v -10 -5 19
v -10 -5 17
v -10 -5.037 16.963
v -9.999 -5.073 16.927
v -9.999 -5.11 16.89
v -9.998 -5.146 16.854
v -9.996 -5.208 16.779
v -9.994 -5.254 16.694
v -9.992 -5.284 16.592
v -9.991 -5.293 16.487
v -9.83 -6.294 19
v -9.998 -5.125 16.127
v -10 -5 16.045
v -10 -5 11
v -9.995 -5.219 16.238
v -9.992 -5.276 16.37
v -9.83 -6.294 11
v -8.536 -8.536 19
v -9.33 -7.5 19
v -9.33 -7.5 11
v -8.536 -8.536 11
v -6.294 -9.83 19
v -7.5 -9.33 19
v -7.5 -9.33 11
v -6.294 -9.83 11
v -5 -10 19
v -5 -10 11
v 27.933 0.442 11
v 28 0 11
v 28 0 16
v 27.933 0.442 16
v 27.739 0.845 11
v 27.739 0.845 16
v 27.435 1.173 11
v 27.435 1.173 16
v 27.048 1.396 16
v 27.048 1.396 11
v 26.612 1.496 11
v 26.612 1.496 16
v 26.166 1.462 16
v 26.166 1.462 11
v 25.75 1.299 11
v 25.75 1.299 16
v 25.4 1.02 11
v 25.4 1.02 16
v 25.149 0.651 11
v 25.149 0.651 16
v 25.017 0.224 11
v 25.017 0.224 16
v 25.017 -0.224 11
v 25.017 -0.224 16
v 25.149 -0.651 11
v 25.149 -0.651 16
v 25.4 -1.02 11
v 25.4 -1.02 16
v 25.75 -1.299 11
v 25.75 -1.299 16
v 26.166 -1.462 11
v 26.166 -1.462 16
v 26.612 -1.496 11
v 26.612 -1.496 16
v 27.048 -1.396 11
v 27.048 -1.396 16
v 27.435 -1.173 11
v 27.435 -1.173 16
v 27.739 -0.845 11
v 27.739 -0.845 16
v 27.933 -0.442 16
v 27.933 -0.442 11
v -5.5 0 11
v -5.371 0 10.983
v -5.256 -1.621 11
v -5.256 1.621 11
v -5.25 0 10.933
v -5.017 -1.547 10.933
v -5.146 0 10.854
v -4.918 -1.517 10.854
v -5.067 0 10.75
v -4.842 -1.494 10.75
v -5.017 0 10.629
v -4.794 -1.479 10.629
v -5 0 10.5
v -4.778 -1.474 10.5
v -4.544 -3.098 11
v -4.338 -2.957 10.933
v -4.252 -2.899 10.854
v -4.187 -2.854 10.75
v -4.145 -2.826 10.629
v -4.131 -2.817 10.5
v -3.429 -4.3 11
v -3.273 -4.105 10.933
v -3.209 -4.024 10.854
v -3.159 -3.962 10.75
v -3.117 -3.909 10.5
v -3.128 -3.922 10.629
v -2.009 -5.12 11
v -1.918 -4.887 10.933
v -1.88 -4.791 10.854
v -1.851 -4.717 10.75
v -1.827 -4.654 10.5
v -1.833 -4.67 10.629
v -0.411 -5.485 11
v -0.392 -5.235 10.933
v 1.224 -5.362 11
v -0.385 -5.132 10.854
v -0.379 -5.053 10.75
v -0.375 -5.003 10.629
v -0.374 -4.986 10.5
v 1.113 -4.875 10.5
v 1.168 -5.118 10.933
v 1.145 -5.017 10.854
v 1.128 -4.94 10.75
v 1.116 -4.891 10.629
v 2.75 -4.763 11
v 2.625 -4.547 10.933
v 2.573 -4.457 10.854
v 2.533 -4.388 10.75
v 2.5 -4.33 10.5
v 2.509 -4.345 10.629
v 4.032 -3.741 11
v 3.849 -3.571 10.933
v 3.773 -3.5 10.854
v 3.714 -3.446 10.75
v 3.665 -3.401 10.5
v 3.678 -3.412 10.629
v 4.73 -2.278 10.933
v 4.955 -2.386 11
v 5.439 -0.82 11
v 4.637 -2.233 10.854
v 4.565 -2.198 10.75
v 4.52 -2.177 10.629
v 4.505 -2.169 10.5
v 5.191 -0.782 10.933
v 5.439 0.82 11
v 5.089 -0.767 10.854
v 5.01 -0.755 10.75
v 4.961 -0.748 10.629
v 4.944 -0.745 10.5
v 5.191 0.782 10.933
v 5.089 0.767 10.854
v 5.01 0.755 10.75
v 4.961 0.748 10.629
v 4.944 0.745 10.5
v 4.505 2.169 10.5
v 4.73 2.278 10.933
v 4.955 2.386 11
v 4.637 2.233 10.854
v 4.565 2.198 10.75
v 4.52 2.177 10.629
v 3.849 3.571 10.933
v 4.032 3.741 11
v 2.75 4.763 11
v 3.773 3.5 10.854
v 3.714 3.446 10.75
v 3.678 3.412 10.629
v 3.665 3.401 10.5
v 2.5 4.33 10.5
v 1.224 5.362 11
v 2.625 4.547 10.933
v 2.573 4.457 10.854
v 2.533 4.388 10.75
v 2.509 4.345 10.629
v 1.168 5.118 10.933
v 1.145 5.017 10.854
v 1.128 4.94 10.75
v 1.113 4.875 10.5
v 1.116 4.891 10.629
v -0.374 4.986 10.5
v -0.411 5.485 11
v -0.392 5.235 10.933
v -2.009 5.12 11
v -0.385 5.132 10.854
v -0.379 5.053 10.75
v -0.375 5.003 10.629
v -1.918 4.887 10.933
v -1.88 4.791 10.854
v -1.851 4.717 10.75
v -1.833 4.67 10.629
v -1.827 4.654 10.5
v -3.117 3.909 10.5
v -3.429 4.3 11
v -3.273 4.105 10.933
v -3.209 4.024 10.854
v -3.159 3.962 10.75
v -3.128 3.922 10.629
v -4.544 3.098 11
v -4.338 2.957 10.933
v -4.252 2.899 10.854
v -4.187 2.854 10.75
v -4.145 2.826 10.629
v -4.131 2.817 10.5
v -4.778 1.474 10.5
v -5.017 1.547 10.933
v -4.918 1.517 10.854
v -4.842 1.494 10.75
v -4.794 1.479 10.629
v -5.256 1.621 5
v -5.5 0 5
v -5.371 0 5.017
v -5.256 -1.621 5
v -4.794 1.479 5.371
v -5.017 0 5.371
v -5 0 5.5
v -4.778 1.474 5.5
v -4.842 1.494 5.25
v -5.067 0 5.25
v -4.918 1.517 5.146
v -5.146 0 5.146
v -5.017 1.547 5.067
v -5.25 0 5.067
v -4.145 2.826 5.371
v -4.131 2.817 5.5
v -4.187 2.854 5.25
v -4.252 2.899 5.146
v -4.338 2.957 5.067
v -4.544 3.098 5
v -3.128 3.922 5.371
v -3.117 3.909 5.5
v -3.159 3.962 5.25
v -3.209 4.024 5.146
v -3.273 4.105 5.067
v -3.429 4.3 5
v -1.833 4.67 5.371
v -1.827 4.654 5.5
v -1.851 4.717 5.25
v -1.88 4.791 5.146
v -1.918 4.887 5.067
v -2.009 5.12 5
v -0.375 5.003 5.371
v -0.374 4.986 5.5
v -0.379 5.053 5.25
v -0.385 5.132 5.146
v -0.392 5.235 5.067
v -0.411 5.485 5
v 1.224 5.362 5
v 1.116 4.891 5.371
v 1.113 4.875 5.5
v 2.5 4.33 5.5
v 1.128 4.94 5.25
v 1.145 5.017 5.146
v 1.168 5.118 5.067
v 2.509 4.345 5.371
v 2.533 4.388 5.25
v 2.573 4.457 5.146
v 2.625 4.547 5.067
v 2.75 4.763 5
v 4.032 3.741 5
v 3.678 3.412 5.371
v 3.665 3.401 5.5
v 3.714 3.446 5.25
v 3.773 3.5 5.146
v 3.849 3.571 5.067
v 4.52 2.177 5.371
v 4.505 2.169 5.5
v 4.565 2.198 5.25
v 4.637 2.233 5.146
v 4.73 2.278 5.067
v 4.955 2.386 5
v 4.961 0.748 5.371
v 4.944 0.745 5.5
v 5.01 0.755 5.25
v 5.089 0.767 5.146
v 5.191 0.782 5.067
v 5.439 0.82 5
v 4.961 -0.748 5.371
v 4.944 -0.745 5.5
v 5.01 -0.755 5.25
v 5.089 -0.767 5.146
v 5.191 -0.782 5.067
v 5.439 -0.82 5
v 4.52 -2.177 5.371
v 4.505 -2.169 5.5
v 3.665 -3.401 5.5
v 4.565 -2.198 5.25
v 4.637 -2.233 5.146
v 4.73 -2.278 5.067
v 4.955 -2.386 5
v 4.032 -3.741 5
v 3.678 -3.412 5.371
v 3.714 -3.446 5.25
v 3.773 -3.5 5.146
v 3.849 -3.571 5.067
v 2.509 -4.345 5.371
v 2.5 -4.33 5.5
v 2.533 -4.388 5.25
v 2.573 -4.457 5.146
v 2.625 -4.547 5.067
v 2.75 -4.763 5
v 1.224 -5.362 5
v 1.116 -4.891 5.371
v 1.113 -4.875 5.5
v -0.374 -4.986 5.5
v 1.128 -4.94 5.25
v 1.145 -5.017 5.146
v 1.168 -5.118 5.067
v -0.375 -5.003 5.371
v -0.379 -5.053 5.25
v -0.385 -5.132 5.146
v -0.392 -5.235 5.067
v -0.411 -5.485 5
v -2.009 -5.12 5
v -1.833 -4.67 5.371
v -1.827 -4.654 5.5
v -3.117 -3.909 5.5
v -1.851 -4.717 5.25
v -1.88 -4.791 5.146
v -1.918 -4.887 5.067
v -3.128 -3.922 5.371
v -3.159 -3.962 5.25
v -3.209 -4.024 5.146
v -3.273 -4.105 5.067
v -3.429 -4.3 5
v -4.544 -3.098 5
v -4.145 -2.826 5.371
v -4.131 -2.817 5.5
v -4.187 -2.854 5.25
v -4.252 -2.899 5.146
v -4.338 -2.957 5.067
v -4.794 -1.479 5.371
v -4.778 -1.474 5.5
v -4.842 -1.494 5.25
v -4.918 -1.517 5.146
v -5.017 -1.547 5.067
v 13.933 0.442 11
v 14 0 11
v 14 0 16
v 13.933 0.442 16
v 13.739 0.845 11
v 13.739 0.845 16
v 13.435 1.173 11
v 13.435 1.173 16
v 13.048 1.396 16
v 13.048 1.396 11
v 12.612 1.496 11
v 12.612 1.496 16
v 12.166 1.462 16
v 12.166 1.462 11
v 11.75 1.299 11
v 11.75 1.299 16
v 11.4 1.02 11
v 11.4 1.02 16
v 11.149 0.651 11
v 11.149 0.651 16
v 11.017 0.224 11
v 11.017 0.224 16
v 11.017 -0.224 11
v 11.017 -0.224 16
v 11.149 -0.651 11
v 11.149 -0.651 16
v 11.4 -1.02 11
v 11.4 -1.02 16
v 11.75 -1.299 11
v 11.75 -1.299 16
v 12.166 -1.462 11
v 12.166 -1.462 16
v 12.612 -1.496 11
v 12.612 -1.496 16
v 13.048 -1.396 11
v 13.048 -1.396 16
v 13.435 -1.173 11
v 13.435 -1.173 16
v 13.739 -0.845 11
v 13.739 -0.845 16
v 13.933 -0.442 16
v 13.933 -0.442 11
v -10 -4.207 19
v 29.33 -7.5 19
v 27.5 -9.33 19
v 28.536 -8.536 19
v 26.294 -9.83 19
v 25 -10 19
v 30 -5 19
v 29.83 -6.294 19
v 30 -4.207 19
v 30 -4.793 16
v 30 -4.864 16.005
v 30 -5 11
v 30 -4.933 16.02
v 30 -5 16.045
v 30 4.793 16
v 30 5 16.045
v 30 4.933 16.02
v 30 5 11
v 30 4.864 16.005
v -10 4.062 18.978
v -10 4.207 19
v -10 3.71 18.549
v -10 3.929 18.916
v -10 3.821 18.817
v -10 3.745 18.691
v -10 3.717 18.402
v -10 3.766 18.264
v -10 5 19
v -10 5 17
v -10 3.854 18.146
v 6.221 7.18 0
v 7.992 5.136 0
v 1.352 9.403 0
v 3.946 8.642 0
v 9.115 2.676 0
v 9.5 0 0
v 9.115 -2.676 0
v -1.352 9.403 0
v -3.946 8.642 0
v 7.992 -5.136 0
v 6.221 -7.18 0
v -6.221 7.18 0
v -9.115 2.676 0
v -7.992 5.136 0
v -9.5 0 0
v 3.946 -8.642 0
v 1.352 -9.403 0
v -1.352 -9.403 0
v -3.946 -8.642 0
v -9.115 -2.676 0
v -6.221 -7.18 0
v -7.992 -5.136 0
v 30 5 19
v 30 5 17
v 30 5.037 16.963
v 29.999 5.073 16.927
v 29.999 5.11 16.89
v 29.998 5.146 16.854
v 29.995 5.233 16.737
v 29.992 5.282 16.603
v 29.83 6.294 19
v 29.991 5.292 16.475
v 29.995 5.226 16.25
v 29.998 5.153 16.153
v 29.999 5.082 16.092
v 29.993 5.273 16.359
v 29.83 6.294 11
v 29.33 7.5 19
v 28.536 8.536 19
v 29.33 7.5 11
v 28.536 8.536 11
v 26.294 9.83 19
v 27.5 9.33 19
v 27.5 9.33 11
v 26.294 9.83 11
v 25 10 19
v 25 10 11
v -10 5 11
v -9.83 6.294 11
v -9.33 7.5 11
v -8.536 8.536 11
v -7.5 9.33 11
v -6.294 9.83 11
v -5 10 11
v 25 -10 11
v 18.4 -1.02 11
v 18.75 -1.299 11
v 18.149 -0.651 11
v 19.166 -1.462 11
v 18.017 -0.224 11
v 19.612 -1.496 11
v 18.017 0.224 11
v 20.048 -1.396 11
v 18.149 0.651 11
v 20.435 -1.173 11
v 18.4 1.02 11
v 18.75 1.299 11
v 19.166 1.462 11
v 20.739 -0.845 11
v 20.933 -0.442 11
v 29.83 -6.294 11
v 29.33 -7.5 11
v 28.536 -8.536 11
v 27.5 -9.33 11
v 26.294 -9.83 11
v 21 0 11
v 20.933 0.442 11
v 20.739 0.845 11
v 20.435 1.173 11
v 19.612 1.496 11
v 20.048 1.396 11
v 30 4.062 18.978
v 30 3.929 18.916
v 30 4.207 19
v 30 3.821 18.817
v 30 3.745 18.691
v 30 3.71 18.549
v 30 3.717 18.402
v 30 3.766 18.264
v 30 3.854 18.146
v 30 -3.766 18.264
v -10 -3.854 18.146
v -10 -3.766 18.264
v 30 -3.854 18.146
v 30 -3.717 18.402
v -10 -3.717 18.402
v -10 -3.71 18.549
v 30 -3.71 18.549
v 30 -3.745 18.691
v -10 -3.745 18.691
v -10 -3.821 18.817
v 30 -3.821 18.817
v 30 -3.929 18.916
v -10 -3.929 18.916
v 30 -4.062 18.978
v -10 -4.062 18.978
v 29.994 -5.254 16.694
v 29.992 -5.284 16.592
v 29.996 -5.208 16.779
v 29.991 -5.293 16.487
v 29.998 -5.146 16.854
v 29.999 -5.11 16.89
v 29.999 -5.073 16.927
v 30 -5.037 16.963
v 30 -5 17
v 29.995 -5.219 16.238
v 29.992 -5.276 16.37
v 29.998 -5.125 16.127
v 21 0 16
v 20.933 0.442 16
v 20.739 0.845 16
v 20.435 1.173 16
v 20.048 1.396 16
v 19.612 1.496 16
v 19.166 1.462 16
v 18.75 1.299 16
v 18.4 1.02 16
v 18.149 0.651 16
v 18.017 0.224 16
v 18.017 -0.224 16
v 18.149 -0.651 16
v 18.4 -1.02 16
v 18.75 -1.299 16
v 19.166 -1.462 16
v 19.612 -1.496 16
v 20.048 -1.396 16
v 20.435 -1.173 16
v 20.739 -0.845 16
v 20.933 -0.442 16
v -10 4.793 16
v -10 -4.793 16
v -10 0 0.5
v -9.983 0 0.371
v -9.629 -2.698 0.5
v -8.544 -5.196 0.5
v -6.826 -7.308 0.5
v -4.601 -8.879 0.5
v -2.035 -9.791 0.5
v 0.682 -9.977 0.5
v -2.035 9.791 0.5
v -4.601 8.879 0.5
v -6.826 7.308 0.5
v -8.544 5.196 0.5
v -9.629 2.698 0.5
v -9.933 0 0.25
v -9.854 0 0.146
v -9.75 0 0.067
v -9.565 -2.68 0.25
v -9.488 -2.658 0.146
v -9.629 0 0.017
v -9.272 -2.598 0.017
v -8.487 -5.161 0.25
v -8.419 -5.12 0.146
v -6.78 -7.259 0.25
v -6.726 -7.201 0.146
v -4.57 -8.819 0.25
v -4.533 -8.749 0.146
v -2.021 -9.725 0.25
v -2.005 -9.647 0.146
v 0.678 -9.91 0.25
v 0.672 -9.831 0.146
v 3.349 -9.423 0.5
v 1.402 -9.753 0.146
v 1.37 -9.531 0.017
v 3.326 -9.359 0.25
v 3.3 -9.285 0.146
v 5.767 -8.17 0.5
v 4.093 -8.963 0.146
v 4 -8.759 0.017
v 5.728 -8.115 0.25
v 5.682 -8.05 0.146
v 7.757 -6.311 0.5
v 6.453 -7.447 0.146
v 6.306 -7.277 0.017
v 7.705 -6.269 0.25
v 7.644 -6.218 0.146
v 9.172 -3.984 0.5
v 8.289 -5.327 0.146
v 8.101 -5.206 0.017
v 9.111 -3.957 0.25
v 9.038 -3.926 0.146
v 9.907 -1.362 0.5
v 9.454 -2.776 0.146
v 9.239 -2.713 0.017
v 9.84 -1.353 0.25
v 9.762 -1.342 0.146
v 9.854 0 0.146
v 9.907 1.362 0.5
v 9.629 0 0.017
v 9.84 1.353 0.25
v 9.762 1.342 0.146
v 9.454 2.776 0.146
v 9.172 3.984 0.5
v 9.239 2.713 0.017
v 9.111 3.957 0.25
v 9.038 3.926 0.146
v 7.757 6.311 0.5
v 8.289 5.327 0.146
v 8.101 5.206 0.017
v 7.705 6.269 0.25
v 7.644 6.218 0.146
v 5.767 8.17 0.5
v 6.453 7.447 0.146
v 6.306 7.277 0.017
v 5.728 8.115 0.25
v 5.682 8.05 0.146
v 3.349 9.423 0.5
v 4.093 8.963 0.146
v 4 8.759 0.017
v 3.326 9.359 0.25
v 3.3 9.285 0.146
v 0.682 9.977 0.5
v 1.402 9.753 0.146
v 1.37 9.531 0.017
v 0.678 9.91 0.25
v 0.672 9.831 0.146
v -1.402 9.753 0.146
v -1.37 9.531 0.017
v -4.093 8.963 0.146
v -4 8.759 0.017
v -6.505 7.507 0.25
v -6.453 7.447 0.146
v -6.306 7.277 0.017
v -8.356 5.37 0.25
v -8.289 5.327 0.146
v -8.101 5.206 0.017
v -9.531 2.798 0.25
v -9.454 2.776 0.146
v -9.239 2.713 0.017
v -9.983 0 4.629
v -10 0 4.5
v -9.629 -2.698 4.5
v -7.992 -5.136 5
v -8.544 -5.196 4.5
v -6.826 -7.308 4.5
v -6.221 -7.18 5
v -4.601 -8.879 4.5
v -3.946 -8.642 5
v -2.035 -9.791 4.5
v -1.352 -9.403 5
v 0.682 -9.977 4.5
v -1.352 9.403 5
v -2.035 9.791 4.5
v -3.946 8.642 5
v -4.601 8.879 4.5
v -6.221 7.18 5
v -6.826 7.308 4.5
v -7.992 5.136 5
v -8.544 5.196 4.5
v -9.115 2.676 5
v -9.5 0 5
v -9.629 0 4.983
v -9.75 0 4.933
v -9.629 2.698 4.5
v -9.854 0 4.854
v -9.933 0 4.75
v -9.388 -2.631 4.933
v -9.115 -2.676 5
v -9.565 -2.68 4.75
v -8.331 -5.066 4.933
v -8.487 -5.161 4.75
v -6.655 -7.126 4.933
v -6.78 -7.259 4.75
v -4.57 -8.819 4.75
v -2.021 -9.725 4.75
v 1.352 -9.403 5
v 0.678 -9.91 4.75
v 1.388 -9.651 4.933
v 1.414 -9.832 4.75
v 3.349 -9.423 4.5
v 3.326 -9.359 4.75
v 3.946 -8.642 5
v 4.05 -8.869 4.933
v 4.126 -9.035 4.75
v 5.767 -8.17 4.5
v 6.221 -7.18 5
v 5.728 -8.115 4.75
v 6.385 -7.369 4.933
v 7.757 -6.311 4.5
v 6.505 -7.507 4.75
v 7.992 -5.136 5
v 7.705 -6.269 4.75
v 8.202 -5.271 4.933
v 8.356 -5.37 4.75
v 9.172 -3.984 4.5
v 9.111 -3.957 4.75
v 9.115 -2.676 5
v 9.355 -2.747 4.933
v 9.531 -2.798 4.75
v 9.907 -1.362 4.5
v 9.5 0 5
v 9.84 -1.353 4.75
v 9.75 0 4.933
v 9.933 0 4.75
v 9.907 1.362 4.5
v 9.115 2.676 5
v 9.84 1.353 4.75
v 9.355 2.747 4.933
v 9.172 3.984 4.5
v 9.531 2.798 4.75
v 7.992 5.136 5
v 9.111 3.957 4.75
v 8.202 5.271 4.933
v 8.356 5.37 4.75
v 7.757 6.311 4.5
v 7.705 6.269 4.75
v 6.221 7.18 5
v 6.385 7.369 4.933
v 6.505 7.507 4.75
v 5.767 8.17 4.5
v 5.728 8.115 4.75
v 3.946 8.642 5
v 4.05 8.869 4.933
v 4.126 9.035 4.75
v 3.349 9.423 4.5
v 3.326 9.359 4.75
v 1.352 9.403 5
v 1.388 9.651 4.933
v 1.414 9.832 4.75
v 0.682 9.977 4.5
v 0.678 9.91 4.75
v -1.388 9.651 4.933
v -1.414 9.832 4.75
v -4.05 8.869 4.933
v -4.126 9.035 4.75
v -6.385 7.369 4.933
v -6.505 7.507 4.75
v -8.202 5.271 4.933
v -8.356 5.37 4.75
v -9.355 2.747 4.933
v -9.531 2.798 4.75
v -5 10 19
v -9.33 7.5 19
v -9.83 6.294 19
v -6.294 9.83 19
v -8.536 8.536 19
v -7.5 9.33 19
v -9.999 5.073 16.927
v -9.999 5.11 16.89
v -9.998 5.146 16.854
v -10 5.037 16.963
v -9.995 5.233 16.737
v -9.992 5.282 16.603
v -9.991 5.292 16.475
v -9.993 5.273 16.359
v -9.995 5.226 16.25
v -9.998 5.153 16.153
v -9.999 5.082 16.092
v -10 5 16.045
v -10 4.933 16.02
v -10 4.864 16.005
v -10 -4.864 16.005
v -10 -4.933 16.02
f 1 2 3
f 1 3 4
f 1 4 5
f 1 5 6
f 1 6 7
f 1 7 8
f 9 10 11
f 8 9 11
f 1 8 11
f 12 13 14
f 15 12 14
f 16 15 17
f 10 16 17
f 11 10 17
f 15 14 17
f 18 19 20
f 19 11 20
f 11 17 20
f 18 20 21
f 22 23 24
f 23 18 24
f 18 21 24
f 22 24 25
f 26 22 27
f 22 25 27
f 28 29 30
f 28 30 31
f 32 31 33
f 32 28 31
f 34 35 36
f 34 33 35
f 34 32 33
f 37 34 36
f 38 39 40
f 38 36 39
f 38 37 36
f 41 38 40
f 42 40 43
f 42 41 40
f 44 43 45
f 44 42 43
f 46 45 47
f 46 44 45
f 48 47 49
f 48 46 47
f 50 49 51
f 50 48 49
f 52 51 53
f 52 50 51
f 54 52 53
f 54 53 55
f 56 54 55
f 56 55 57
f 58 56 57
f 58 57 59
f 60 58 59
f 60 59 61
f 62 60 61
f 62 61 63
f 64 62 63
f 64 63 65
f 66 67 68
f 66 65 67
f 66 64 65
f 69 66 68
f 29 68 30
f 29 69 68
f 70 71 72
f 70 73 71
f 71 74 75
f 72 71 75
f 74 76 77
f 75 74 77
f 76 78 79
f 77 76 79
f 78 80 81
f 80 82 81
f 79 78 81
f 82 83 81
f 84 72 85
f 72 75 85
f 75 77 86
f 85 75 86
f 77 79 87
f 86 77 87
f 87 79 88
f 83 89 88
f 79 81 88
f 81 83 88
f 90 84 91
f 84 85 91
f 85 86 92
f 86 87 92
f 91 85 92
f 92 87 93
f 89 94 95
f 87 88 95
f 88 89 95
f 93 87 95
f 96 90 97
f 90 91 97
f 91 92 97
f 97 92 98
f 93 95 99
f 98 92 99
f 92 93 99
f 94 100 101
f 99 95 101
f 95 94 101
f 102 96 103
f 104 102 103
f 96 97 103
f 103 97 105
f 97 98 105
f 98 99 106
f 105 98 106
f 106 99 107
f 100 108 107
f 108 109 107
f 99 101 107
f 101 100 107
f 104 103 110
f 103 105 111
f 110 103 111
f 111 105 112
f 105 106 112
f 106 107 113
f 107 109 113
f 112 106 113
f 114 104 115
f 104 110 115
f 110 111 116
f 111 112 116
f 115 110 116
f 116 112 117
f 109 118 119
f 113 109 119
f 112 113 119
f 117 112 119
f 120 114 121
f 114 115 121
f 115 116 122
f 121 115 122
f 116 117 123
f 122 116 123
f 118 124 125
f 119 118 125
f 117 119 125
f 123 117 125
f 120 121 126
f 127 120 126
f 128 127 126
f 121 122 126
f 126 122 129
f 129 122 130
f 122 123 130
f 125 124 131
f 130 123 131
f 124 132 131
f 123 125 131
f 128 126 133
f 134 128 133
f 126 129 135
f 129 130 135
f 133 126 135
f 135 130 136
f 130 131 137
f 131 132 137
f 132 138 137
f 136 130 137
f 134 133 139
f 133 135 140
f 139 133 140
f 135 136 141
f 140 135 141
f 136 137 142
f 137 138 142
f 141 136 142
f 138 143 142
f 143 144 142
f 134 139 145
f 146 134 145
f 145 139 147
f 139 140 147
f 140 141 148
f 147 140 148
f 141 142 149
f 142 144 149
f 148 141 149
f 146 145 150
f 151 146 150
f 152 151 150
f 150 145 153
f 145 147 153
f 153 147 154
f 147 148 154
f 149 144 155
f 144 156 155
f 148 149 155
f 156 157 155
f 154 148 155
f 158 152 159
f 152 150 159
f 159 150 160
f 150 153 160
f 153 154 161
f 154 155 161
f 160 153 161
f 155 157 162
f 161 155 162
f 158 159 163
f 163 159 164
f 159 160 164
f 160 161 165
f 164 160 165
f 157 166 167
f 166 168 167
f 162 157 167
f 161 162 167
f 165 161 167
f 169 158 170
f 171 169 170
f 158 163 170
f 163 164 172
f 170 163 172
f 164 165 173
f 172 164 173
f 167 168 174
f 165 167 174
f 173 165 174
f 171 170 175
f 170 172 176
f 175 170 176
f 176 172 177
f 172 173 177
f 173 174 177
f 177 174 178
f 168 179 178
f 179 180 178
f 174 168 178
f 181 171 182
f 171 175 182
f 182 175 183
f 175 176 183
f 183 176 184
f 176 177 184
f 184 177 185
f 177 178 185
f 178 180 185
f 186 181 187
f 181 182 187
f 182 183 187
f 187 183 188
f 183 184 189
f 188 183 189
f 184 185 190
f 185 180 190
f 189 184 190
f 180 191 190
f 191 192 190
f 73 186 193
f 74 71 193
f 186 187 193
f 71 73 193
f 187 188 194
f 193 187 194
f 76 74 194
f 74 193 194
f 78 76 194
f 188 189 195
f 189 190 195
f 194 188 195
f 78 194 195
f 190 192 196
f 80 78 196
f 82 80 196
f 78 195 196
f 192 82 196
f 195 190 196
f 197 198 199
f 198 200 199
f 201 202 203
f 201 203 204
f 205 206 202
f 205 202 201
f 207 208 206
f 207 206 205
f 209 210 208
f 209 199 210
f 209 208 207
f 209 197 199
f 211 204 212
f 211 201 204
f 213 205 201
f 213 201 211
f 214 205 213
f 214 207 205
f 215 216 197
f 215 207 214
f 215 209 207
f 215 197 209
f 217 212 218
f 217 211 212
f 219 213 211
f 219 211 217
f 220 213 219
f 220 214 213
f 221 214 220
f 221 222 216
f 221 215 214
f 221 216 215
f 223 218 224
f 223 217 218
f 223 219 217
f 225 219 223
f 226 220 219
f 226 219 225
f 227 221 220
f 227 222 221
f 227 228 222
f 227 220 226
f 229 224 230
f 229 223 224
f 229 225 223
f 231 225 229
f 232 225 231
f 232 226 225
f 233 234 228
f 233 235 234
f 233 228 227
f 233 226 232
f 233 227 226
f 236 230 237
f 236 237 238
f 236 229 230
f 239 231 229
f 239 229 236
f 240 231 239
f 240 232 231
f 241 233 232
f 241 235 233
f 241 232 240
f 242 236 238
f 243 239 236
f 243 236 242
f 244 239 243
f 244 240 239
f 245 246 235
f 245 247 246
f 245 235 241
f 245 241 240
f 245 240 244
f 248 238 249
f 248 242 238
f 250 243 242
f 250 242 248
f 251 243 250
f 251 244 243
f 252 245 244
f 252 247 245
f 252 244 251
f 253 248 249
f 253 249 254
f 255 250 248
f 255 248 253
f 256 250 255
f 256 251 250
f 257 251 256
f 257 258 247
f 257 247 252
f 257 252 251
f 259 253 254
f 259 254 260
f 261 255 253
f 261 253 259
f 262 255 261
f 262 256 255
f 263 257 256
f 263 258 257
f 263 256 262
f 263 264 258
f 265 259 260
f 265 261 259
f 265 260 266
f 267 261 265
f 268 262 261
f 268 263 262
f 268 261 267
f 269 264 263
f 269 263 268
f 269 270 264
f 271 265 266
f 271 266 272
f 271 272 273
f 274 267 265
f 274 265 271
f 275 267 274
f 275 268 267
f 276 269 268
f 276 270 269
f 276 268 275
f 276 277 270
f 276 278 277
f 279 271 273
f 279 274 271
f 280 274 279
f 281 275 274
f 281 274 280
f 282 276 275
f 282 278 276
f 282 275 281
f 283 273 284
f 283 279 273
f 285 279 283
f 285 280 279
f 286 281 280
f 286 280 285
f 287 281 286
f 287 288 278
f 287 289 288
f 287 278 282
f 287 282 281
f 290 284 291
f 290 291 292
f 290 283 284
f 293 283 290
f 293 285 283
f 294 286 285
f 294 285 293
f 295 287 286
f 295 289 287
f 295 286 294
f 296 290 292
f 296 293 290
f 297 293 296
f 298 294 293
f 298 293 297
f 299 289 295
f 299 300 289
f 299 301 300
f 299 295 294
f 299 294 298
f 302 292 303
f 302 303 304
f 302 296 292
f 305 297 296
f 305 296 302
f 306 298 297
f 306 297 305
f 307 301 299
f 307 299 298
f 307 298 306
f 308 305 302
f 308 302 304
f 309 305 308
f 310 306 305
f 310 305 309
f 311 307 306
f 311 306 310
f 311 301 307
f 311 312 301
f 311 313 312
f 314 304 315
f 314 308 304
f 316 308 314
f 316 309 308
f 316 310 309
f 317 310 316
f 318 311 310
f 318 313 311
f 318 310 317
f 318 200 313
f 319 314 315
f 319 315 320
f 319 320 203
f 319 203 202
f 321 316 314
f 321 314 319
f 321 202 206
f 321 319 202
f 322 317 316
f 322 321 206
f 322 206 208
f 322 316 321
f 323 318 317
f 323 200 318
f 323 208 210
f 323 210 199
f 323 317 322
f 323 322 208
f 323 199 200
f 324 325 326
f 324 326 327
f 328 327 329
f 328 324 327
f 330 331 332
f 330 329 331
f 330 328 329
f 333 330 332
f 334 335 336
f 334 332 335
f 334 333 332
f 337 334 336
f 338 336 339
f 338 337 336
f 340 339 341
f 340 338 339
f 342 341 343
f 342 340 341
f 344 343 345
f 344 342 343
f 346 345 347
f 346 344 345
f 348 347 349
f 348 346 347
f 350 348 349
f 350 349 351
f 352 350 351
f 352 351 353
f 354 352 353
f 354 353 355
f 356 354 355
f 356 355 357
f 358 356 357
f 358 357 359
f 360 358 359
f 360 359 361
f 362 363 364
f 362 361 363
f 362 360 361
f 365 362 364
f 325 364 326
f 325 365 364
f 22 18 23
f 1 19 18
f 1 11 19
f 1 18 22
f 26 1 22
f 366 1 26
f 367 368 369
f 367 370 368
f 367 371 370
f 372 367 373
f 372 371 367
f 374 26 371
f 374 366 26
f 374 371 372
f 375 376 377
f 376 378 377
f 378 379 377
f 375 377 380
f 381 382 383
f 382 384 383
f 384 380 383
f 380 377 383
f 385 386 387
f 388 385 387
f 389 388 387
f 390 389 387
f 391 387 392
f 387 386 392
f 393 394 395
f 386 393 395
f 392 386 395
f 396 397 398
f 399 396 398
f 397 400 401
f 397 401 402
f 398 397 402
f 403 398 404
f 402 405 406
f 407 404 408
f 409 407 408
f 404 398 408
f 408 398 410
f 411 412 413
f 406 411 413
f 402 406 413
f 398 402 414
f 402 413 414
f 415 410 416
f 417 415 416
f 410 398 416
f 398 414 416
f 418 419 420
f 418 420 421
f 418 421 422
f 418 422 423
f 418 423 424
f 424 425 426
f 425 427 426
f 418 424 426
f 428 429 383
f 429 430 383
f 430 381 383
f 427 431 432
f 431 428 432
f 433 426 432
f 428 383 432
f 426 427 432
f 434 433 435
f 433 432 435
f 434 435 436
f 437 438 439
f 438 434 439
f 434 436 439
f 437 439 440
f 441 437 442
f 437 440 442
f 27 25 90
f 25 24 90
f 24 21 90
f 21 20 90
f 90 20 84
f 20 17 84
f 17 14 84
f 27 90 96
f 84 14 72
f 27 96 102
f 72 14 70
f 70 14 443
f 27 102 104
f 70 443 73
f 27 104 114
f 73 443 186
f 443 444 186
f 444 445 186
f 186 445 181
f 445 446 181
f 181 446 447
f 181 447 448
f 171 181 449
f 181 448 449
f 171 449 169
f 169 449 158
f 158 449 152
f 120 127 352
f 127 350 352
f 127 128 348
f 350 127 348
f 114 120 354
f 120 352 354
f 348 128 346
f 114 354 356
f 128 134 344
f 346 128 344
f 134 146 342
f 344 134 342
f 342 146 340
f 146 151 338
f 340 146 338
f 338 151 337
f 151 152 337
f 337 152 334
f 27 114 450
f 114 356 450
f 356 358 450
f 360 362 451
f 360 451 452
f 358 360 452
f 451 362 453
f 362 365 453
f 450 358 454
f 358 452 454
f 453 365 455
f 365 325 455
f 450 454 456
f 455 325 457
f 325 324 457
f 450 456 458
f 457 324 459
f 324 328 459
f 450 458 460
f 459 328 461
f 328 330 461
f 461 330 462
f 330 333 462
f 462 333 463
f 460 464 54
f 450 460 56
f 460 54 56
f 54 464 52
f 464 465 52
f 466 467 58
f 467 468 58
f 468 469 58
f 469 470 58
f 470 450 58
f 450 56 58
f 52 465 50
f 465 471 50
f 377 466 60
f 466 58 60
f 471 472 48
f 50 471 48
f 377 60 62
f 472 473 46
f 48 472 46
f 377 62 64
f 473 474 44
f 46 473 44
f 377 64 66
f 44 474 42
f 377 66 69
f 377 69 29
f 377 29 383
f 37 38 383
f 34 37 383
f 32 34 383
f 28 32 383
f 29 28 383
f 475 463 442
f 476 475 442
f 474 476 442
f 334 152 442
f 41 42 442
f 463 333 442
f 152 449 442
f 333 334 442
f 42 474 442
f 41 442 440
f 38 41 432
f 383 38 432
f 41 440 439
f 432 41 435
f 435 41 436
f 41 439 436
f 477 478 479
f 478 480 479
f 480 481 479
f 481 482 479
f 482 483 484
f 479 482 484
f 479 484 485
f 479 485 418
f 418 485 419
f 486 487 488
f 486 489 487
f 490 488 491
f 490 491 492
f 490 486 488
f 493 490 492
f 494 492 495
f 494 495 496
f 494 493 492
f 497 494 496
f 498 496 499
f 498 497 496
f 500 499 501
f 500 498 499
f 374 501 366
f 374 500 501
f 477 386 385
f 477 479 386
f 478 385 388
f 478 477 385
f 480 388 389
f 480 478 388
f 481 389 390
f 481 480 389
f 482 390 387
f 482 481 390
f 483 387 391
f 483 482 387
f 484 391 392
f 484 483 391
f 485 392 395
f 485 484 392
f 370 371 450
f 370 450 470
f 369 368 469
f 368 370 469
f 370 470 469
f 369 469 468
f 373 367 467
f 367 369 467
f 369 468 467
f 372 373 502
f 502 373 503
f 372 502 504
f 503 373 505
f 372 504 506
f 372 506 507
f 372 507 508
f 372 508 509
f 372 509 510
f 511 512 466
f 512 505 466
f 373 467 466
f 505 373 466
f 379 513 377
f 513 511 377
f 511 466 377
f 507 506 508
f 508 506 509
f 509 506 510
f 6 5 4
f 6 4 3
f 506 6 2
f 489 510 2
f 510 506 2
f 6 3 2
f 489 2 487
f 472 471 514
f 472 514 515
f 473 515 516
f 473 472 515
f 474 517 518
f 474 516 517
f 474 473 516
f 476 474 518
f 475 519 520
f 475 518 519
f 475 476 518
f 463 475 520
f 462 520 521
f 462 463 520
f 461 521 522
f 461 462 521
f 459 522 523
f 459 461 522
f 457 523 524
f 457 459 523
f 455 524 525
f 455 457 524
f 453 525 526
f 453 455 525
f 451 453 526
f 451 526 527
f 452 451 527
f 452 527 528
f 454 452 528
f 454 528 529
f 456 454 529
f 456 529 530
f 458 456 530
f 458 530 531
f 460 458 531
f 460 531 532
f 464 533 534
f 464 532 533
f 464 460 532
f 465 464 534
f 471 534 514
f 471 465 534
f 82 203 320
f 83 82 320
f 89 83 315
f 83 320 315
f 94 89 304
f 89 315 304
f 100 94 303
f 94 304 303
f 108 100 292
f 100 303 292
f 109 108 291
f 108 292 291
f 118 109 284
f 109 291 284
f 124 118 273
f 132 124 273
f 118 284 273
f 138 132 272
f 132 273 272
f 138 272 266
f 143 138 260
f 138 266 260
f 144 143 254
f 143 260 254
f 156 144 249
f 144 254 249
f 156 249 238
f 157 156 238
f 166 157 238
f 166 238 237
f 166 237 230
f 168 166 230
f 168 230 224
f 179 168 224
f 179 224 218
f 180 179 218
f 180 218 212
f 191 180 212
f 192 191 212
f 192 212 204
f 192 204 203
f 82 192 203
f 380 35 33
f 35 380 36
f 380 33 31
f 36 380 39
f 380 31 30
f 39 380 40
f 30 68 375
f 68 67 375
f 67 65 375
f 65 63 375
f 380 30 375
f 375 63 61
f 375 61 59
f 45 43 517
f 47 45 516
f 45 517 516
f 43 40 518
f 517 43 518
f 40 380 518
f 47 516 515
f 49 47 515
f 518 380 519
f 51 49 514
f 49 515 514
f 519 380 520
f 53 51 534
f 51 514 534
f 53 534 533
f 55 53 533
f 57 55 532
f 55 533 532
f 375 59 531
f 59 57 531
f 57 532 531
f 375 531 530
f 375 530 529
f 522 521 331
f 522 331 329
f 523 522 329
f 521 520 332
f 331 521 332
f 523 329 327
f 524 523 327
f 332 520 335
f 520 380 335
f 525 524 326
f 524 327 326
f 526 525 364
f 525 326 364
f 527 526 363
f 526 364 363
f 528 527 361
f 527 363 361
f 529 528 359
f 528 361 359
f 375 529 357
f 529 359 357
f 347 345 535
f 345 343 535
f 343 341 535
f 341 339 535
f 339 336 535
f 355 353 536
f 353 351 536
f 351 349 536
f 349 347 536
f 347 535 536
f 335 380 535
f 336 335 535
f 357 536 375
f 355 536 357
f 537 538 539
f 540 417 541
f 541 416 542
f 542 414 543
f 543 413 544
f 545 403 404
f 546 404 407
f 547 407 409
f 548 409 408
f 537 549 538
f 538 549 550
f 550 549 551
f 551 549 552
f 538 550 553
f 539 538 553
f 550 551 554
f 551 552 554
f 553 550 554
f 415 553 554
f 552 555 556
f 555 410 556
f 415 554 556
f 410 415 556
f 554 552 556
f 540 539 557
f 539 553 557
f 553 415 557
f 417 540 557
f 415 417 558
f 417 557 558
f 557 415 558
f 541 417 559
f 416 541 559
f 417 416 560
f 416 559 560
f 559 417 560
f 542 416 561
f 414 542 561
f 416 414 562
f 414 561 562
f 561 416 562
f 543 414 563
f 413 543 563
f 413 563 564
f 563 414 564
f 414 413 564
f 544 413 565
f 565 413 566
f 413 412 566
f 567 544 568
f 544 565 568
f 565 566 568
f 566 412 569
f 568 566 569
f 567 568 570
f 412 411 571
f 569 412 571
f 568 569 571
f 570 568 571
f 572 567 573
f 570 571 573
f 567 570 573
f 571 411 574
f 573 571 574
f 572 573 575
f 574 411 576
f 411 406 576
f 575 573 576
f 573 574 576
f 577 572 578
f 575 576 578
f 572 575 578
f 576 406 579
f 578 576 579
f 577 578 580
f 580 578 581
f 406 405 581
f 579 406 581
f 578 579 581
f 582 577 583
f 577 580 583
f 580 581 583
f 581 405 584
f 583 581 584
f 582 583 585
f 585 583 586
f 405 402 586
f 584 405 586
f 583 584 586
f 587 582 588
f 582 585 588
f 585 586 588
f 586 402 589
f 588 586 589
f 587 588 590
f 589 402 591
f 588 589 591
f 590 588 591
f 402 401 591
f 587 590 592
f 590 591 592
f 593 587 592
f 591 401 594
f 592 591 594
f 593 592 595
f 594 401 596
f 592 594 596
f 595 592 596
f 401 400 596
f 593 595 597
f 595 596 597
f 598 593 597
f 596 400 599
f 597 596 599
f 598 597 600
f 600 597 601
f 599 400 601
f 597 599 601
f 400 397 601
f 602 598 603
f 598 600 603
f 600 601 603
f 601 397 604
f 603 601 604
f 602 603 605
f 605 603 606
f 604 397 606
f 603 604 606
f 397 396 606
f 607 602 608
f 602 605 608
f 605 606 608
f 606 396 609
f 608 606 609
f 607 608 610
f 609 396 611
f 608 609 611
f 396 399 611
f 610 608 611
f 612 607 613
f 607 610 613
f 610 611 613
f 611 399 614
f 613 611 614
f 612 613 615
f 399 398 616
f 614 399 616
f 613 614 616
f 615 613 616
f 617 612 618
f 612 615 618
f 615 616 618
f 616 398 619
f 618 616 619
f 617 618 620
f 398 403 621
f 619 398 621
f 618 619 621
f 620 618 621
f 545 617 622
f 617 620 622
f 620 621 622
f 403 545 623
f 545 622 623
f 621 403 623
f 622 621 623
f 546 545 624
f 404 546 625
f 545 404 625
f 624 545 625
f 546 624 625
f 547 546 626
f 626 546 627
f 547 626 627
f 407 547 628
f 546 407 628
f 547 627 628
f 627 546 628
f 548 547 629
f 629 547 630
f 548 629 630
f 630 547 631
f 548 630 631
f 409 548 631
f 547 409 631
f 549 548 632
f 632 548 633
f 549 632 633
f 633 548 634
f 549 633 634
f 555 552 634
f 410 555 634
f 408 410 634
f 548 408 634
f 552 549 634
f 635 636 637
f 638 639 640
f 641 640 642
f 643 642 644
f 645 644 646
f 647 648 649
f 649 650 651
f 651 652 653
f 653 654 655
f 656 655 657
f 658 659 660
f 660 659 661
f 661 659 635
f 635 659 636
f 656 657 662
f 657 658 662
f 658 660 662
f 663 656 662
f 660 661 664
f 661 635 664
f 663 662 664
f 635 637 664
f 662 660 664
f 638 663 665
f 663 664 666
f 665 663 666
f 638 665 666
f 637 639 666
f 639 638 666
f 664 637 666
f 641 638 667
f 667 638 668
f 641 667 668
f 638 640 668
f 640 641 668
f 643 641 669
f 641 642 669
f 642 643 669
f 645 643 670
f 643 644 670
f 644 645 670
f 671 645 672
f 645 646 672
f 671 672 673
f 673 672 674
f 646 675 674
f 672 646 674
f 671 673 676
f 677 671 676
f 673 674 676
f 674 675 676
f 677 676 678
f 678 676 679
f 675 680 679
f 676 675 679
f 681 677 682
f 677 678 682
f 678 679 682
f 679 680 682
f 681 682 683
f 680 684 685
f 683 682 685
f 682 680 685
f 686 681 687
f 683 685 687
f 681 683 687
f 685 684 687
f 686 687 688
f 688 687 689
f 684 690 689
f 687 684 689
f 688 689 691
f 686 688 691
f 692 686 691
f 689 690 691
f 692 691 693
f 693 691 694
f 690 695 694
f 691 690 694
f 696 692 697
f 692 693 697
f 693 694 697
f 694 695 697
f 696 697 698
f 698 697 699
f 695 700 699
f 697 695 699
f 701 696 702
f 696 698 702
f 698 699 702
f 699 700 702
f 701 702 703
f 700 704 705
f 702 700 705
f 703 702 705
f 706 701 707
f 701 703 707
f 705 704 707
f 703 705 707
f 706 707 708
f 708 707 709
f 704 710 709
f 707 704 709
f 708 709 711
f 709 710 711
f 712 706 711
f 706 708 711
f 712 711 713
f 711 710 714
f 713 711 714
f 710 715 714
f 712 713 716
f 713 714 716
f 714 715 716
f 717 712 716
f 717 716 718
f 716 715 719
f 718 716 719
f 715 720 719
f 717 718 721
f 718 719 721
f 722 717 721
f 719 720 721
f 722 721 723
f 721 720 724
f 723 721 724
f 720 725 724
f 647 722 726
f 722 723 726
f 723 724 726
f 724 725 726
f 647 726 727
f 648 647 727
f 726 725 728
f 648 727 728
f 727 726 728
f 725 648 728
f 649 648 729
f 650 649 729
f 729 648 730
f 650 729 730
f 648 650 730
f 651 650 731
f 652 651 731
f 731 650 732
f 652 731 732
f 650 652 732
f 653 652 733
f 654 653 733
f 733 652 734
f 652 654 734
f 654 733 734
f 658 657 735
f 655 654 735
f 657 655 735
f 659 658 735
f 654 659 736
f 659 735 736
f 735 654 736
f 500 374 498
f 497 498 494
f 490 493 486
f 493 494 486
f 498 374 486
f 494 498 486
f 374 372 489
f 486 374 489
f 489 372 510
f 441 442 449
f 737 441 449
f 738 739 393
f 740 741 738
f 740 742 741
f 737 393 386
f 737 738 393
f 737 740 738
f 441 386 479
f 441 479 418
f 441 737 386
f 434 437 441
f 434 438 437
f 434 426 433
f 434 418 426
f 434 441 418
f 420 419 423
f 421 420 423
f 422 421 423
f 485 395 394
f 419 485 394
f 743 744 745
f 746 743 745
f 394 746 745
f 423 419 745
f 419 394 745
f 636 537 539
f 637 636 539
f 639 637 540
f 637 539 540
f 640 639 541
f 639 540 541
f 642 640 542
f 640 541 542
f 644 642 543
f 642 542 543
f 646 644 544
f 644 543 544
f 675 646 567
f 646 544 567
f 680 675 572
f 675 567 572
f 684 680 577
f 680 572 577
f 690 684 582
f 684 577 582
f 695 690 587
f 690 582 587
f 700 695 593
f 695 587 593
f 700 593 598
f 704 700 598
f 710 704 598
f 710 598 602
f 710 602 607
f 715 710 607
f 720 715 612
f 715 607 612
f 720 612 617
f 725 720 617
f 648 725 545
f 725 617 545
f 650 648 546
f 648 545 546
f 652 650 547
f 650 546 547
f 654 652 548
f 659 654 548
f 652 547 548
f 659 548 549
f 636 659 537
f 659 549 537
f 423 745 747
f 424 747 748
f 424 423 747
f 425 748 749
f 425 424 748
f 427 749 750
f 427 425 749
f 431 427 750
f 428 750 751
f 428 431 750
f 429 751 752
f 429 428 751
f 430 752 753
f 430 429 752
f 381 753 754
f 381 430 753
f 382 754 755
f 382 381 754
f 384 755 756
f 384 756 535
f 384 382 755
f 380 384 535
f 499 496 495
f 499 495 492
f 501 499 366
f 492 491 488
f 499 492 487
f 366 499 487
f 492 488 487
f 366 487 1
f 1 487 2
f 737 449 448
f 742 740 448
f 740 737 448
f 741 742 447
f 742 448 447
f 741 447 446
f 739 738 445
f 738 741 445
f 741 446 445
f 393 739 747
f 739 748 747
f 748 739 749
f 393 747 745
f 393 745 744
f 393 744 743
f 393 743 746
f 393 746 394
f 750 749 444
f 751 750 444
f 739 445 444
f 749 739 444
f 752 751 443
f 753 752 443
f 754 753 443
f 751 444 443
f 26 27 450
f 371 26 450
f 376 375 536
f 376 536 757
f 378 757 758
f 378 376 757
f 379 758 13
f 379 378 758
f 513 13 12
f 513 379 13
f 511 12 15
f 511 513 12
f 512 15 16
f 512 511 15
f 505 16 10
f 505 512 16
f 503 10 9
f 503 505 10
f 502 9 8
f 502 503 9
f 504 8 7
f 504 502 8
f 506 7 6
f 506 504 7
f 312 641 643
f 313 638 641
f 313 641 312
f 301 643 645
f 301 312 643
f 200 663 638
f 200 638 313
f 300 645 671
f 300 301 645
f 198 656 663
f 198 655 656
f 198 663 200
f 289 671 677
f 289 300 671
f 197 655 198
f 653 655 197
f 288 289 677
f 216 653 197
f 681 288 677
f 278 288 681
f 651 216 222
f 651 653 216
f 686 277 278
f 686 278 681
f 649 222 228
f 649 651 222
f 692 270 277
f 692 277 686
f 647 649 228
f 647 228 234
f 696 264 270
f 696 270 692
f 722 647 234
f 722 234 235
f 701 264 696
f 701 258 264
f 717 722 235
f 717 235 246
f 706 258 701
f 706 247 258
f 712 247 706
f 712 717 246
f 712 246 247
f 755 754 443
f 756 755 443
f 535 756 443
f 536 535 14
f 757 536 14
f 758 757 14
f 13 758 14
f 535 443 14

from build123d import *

# Parameters (mm, degrees)
BOSS_EXTRUDE1_DEPTH = 5
SKETCH2_R           = 5
BOSS_EXTRUDE2_DEPTH = 11
BOSS_EXTRUDE3_DEPTH = 8
CUT_EXTRUDE1_DEPTH  = 42
SKETCH6_R           = 1.5
CUT_EXTRUDE2_DEPTH  = 32
LPATTERN1_COUNT     = 3
LPATTERN1_PITCH     = 7
FILLET1_R           = 0.5
FILLET2_R           = 5
FILLET3_R           = 0.5


with BuildPart() as part:
    # Sketch1 → Boss-Extrude1 (new body)
    with BuildSketch(Plane.XY):
        with BuildLine():
            ThreePointArc((10, 0), (0, 10), (-10, 0))
            ThreePointArc((-10, 0), (0, -10), (10, 0))
        make_face()
    extrude(amount=BOSS_EXTRUDE1_DEPTH)

    # Sketch2 → Boss-Extrude2 (add)
    with BuildSketch(Plane.XY):
        with Locations(Location((0, 0, 0), (0, 0, 180))):
            Circle(SKETCH2_R)
    extrude(amount=BOSS_EXTRUDE2_DEPTH)

    # Sketch3 → Boss-Extrude3 (add)
    with BuildSketch(Plane.XY.offset(11)):
        Polygon((10, -10), (30, -10), (30, 10), (10, 10), (-10, 10), (-10, -10), align=None)
    extrude(amount=BOSS_EXTRUDE3_DEPTH)

    # Sketch5 → Cut-Extrude1 (cut)
    with BuildSketch(Plane(origin=(-10, 0, 0), x_dir=(0, 0, -1), z_dir=(1, 0, 0))):
        Polygon((-19, 3), (-16, 6), (-16, -6), (-19, -3), align=None)
    extrude(amount=CUT_EXTRUDE1_DEPTH, mode=Mode.SUBTRACT)

    # Sketch6 → Cut-Extrude2 (cut)
    with BuildSketch(Plane.XY):
        with Locations((26.5, 0)):
            Circle(SKETCH6_R)
    cut_extrude2 = extrude(amount=CUT_EXTRUDE2_DEPTH, mode=Mode.SUBTRACT)

    # LPattern1: Cut-Extrude2 ×3
    with Locations(*[(-i * LPATTERN1_PITCH, 0, 0) for i in range(1, LPATTERN1_COUNT)]):
        add(cut_extrude2, mode=Mode.SUBTRACT)

    # Fillet1
    fillet1_edges = [part.edges().sort_by_distance(p)[0] for p in [
        (10, 3, 19),
        (10, -3, 19),
        (10, -6, 16),
        (10, 6, 16),
    ]]
    fillet(fillet1_edges, radius=FILLET1_R)

    # Fillet2
    # the kernel refuses this fillet: 5 mm, written as the material it takes off along each edge
    with BuildSketch(Plane(origin=(-10, -10, -1.5), x_dir=(1, 0, 0), z_dir=(0, 0, 1)), Plane(origin=(30, -10, -1.5), x_dir=(0, 1, 0), z_dir=(0, 0, 1))) as fillet2_piece_1:
        with BuildLine():
            CenterArc((FILLET2_R, FILLET2_R), FILLET2_R, 180, 90)
            Line((0, FILLET2_R), (0, 0))
            Line((0, 0), (FILLET2_R, 0))
        make_face()
    extrude(amount=33, mode=Mode.SUBTRACT)
    with BuildSketch(Plane(origin=(30, 10, -1.5), x_dir=(0, -1, 0), z_dir=(0, 0, 1)), Plane(origin=(-10, 10, -1.5), x_dir=(1, 0, 0), z_dir=(0, 0, 1))) as fillet2_piece_2:
        with BuildLine():
            CenterArc((FILLET2_R, -FILLET2_R), FILLET2_R, 90, 90)
            Line((0, -FILLET2_R), (0, 0))
            Line((0, 0), (FILLET2_R, 0))
        make_face()
    extrude(amount=33, mode=Mode.SUBTRACT)

    # Fillet3
    fillet3_edges = [part.edges().sort_by_distance(p)[0] for p in [
        (5, 0, 11),
        (10, 0, 0),
        (10, 0, 5),
        (5, 0, 5),
    ]]
    fillet(fillet3_edges, radius=FILLET3_R)


solid = part.part
